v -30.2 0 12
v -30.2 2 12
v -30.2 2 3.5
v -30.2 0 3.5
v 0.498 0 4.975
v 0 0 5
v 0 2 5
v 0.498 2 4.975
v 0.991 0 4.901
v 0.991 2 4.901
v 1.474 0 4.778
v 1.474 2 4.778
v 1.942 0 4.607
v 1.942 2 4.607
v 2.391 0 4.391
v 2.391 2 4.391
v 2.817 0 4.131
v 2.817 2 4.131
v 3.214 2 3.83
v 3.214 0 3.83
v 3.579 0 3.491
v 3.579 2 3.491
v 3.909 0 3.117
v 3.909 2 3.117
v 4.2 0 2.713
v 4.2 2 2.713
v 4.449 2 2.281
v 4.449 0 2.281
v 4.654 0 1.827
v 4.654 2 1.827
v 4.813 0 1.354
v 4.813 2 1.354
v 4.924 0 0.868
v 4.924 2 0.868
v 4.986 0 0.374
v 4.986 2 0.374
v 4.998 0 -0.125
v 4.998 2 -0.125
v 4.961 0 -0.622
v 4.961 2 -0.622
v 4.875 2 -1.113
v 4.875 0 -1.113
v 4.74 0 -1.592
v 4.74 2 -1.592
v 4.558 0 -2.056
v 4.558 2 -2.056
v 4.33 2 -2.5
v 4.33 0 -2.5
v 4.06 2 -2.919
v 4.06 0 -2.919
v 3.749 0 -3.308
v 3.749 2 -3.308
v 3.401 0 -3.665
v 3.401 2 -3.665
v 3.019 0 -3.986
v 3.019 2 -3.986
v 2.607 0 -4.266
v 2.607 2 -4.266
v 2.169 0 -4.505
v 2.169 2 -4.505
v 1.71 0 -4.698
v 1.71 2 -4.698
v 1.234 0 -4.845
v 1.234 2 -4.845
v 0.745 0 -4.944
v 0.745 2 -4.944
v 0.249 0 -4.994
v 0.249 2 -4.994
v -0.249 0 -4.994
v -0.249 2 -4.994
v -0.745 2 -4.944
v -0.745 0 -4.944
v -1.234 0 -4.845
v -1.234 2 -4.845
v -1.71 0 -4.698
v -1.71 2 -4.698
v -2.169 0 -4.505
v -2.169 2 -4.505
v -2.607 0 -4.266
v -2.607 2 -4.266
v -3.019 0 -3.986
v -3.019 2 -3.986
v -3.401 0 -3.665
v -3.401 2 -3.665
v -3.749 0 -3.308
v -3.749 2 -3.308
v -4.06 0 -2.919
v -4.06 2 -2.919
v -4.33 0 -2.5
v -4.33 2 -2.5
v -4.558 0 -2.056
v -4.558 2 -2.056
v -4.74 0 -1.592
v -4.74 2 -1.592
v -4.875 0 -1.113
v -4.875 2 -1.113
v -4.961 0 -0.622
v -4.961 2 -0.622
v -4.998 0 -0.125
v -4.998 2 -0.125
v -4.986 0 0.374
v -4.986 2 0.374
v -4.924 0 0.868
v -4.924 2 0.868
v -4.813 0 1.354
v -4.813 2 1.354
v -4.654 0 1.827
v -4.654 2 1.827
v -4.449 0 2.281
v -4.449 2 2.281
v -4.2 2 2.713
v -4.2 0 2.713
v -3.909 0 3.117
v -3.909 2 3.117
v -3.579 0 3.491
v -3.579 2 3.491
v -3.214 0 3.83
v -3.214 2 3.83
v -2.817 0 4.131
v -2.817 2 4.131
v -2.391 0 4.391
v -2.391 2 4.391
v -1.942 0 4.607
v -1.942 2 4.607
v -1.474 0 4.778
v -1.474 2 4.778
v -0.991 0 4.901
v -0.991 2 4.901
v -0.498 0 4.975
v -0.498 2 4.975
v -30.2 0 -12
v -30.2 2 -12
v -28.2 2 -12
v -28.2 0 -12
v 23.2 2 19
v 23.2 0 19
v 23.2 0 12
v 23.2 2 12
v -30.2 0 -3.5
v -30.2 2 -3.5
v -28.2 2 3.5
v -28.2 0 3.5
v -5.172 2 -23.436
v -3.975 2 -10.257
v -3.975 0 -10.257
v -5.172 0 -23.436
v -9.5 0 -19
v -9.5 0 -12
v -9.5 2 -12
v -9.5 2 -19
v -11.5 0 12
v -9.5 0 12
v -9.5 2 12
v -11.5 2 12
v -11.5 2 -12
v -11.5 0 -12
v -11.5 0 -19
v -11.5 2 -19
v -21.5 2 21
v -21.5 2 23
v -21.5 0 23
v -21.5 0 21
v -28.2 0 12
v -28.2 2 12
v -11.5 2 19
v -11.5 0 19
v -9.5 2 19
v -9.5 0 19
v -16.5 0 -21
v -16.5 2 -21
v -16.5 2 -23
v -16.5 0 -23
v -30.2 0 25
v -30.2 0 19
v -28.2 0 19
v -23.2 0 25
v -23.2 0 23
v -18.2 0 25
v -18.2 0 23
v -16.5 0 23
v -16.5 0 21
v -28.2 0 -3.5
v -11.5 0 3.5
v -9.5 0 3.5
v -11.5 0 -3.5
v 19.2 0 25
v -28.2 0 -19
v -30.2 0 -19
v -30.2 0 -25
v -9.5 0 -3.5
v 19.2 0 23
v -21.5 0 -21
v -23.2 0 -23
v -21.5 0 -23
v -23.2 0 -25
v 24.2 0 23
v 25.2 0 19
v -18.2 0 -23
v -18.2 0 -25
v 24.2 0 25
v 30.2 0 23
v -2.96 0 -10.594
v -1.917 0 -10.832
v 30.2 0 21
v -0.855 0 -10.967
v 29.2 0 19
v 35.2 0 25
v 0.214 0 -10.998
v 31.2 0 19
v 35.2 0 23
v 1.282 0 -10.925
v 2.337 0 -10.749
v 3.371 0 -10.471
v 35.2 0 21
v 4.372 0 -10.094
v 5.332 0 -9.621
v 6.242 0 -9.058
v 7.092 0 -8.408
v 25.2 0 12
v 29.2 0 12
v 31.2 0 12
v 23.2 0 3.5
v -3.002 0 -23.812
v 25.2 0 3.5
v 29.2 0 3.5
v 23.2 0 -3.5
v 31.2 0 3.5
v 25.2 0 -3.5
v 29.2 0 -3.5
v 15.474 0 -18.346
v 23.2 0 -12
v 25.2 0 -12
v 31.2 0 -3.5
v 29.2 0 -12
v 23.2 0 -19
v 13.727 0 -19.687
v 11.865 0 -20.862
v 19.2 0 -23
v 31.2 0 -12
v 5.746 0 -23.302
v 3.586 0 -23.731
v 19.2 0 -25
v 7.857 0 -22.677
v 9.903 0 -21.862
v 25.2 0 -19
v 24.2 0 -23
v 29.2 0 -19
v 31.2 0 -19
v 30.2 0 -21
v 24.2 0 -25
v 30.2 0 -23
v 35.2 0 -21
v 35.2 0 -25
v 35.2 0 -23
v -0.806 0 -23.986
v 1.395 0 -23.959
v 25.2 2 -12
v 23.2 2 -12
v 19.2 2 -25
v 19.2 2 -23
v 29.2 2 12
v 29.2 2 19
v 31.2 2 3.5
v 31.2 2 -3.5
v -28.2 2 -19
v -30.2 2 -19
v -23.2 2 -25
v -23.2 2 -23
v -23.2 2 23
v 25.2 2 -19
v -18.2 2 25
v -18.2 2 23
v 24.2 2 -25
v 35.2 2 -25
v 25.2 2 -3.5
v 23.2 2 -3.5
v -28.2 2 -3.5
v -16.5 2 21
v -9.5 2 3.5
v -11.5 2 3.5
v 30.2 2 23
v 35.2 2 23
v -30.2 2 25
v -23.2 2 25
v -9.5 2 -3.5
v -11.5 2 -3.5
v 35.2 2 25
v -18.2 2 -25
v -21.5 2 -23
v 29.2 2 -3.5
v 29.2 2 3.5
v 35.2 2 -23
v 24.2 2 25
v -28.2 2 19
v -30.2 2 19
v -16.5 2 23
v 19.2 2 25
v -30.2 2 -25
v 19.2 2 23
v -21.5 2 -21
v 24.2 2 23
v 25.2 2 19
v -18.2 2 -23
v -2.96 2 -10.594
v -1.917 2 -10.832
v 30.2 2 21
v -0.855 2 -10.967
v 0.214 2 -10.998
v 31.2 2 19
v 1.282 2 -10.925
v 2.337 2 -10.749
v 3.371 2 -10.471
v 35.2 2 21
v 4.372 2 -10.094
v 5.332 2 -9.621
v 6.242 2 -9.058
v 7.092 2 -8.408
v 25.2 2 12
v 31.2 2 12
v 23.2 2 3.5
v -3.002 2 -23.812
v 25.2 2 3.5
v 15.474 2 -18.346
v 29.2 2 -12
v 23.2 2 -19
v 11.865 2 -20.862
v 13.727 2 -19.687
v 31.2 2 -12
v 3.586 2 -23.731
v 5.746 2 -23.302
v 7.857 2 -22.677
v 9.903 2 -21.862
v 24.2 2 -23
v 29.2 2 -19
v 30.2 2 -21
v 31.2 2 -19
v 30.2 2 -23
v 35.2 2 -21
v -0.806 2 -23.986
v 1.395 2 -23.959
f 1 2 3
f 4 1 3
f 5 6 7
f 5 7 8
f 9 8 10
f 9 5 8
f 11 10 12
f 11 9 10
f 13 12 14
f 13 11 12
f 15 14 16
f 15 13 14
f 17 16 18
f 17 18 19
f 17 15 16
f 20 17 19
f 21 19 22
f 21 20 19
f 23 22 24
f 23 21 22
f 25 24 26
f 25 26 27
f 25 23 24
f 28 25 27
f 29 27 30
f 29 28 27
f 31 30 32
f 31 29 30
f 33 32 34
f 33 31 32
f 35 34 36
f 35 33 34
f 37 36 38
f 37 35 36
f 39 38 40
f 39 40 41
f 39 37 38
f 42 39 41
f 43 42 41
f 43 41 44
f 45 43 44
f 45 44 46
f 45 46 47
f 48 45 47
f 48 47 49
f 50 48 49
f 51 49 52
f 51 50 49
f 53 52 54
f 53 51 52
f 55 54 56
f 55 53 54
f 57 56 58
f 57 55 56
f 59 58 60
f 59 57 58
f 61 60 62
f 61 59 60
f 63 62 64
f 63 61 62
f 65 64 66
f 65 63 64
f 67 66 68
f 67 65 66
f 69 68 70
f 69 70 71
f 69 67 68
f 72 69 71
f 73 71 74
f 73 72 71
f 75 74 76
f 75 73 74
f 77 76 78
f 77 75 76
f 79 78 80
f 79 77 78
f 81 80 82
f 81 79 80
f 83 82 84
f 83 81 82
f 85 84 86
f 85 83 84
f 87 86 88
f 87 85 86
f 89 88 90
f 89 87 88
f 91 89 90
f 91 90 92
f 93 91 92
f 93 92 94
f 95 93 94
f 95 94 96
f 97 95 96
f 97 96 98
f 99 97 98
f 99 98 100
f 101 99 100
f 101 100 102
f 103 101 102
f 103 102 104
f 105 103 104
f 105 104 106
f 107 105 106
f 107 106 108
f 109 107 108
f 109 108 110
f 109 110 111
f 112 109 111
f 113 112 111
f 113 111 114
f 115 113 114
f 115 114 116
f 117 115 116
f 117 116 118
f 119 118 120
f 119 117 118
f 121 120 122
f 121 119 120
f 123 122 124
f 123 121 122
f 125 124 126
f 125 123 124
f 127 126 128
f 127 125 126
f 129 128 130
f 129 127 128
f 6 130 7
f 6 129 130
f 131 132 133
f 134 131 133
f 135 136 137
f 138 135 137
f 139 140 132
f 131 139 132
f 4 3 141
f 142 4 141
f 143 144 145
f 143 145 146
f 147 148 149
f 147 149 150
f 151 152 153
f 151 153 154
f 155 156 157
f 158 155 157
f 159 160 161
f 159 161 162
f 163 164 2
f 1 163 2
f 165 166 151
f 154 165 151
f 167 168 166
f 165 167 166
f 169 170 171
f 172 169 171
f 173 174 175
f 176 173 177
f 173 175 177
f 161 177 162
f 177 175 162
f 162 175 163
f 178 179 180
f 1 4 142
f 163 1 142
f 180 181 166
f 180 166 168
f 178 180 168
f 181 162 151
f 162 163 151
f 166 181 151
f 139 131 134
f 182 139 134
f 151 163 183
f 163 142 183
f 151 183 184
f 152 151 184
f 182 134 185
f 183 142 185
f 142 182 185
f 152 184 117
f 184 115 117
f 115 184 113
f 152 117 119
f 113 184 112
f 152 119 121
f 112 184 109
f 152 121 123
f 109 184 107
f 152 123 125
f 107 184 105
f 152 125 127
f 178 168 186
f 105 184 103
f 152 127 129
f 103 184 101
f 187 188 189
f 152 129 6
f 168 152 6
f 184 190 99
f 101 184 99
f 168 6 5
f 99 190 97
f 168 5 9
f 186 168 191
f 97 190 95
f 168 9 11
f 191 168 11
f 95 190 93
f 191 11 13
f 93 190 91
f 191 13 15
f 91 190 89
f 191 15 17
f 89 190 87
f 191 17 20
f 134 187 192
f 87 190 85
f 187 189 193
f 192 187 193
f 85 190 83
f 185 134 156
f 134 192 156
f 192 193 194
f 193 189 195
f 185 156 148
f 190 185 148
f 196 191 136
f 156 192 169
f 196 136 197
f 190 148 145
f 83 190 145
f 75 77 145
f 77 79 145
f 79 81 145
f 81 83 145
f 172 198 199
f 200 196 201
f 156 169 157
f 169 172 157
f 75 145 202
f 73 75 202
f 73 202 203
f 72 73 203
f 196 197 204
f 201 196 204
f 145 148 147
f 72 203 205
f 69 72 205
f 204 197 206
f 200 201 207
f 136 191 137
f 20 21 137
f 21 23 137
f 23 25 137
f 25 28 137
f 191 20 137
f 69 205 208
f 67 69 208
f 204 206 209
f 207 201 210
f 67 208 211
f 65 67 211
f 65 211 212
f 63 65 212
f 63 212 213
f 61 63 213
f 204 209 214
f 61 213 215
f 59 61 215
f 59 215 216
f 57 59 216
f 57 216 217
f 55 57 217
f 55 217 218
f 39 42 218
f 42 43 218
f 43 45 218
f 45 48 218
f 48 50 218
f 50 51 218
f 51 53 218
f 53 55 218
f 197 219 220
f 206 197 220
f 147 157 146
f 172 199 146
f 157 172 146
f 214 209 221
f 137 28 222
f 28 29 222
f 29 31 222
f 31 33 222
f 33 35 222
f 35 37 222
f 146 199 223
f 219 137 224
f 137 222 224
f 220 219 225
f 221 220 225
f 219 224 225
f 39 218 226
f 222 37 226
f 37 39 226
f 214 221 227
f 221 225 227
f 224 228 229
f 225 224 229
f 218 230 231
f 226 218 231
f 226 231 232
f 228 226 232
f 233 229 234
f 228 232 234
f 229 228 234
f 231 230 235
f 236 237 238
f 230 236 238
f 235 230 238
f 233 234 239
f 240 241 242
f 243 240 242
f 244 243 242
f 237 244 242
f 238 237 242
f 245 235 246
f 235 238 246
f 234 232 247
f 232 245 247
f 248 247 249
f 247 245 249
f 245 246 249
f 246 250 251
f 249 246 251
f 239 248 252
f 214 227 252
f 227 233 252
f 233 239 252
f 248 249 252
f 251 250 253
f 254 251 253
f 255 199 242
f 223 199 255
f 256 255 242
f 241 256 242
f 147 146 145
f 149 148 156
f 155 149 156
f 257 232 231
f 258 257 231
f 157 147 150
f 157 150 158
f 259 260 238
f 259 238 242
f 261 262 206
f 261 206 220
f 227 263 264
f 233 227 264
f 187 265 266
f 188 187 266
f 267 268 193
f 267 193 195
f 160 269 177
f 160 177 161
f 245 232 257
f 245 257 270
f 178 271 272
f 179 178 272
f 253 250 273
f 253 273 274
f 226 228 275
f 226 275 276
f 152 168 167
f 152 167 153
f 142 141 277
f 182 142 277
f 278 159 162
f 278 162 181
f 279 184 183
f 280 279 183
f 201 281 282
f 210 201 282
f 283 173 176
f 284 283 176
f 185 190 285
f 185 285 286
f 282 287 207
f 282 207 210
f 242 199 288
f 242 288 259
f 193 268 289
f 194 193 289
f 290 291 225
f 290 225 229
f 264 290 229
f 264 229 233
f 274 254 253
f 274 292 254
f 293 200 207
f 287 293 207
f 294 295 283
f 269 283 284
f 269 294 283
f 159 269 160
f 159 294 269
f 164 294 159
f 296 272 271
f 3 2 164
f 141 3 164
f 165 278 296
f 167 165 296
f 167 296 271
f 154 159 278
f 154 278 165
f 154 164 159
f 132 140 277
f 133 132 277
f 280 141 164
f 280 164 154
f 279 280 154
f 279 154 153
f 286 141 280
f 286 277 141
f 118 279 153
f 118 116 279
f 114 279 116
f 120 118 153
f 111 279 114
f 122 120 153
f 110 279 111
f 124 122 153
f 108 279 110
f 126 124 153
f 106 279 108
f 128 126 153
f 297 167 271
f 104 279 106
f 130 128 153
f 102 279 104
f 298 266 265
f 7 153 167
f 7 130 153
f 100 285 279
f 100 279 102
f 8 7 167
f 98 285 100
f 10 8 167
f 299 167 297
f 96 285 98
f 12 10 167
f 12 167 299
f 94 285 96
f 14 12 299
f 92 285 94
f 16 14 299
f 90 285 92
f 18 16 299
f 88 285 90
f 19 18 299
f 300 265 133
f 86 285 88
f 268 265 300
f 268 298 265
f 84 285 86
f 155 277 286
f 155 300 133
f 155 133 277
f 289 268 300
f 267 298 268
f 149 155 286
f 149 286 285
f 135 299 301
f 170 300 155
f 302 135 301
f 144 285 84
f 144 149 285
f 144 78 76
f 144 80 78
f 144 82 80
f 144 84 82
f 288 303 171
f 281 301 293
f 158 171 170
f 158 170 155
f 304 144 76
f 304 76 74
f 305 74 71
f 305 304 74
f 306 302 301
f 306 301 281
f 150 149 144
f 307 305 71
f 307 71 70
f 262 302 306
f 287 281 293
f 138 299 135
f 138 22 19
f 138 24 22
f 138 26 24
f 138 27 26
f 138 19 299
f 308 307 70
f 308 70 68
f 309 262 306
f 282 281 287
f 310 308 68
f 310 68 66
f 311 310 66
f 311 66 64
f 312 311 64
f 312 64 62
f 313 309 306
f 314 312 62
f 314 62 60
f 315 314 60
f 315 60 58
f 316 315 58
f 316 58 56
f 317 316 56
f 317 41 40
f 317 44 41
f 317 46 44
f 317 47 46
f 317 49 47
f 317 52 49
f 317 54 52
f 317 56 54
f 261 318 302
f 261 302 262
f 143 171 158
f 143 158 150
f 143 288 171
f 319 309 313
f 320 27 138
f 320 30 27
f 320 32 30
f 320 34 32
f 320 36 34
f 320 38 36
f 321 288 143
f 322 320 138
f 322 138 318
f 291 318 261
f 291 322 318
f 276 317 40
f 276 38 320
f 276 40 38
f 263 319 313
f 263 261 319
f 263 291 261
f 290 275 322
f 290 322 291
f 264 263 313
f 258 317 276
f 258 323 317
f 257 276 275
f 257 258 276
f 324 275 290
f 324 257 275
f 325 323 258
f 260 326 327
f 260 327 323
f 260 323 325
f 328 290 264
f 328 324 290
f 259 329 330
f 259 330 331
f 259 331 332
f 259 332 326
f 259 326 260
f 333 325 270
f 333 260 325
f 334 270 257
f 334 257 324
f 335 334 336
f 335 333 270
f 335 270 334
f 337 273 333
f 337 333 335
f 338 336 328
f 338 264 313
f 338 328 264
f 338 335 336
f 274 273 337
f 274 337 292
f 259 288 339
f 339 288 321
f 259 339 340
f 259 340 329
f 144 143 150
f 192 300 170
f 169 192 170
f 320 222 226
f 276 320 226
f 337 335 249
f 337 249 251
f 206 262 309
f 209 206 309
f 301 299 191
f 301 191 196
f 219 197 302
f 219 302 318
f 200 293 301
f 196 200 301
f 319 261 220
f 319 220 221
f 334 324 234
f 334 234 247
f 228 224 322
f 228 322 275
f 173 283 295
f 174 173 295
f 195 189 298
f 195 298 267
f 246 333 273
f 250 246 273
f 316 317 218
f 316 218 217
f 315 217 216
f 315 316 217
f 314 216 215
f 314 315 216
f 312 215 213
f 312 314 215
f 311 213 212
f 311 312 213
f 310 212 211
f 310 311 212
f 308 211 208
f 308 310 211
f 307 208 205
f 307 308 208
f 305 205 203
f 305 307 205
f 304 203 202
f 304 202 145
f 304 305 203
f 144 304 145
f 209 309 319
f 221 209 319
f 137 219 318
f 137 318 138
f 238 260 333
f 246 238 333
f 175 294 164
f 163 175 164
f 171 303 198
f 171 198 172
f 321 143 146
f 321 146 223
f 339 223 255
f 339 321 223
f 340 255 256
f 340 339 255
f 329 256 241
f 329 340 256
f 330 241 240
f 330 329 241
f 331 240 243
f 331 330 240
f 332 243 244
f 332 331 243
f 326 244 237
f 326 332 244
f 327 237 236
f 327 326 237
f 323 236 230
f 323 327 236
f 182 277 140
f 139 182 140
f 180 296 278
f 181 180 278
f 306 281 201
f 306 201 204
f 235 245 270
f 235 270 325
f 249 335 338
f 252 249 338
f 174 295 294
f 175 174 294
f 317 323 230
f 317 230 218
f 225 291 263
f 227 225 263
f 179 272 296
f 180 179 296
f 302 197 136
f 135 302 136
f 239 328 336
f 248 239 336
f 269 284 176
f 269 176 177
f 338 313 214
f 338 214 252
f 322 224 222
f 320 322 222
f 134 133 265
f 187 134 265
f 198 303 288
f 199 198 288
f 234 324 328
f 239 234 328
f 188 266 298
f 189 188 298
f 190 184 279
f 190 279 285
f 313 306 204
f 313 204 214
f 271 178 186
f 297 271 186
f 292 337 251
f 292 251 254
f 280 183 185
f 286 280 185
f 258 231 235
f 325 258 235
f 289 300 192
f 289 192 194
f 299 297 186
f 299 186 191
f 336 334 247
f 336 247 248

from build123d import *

# Parameters (mm, degrees)
SKETCH2_W           = 100
SKETCH2_H           = 50
SKETCH2_R           = 5
BOSS_EXTRUDE1_DEPTH = 2
SKETCH5_W           = 2
SKETCH5_H           = 7
CUT_EXTRUDE3_DEPTH  = 2
CUT_EXTRUDE6_DEPTH  = 2
SKETCH11_W          = 5
SKETCH11_H          = 2
CUT_EXTRUDE7_DEPTH  = 2
SKETCH12_W          = 6.5
SKETCH12_H          = 50
SKETCH12_W_2        = 2.8
CUT_EXTRUDE8_DEPTH  = 6
SKETCH13_W          = 12
SKETCH13_H          = 50
SKETCH13_W_2        = 2
SKETCH13_H_2        = 7
SKETCH13_W_3        = 5
SKETCH13_H_3        = 2
CUT_EXTRUDE10_DEPTH = 6


with BuildPart() as part:
    # Sketch2 → Boss-Extrude1 (new body)
    with BuildSketch(Plane(origin=(0, 0, 0), x_dir=(1, 0, 0), z_dir=(0, 1, 0))):
        Rectangle(SKETCH2_W, SKETCH2_H)
        with Locations(Location((0, 0, 0), (0, 0, 270))):
            Circle(SKETCH2_R, mode=Mode.SUBTRACT)
    extrude(amount=BOSS_EXTRUDE1_DEPTH)

    # Sketch5 → Cut-Extrude3 (cut)
    with BuildSketch(Plane(origin=(0, 0, 0), x_dir=(-1, 0, 0), z_dir=(0, -1, 0))):
        with Locations((-24.2, -15.5)):
            Rectangle(SKETCH5_W, SKETCH5_H)
        with Locations((-24.2, 0)):
            Rectangle(SKETCH5_W, SKETCH5_H)
        with Locations((-24.2, 15.5)):
            Rectangle(SKETCH5_W, SKETCH5_H)
        with Locations((10.5, 15.5)):
            Rectangle(SKETCH5_W, SKETCH5_H)
        with Locations((10.5, 0)):
            Rectangle(SKETCH5_W, SKETCH5_H)
        with Locations((10.5, -15.5)):
            Rectangle(SKETCH5_W, SKETCH5_H)
    extrude(amount=-CUT_EXTRUDE3_DEPTH, mode=Mode.SUBTRACT)

    # Sketch10 → Cut-Extrude6 (cut)
    with BuildSketch(Plane(origin=(0, 2, 0), x_dir=(1, 0, 0), z_dir=(0, 1, 0))):
        with BuildLine():
            ThreePointArc((-5.171573663, 23.436186248), (5.745726742, 23.302073389), (15.473926709, 18.345506049))
            Line((15.473926709, 18.345506049), (7.092216408, 8.408356939))
            ThreePointArc((7.092216408, 8.408356939), (1.811815129, 10.849761561), (-3.975341771, 10.256542195))
            Line((-3.975341771, 10.256542195), (-5.171573663, 23.436186248))
        make_face()
    extrude(amount=-CUT_EXTRUDE6_DEPTH, mode=Mode.SUBTRACT)

    # Sketch11 → Cut-Extrude7 (cut)
    with BuildSketch(Plane(origin=(0, 2, 0), x_dir=(1, 0, 0), z_dir=(0, 1, 0))):
        with Locations((32.7, 22)):
            Rectangle(SKETCH11_W, SKETCH11_H)
        with Locations((-19, 22)):
            Rectangle(SKETCH11_W, SKETCH11_H)
        with Locations((-19, -22)):
            Rectangle(SKETCH11_W, SKETCH11_H)
        with Locations((32.7, -22)):
            Rectangle(SKETCH11_W, SKETCH11_H)
    extrude(amount=-CUT_EXTRUDE7_DEPTH, mode=Mode.SUBTRACT)

    # Sketch12 → Cut-Extrude8 (cut)
    with BuildSketch(Plane(origin=(0, 2, 0), x_dir=(1, 0, 0), z_dir=(0, 1, 0))):
        with Locations((-46.75, 0)):
            Rectangle(SKETCH12_W, SKETCH12_H)
        with Locations((48.6, 0)):
            Rectangle(SKETCH12_W_2, SKETCH12_H)
    extrude(amount=-CUT_EXTRUDE8_DEPTH, mode=Mode.SUBTRACT)

    # Sketch13 → Cut-Extrude10 (cut)
    with BuildSketch(Plane(origin=(0, 2, 0), x_dir=(1, 0, 0), z_dir=(0, 1, 0))):
        with Locations((41.2, 0)):
            Rectangle(SKETCH13_W, SKETCH13_H)
        with Locations((30.2, 15.5)):
            Rectangle(SKETCH13_W_2, SKETCH13_H_2)
        with Locations((30.2, -15.5)):
            Rectangle(SKETCH13_W_2, SKETCH13_H_2)
        with Locations((30.2, 0)):
            Rectangle(SKETCH13_W_2, SKETCH13_H_2)
        Polygon((-28.2, 12), (-28.2, 19), (-30.2, 19), (-30.2, 25), (-43.5, 25), (-43.5, -25), (-30.2, -25), (-30.2, -19), (-28.2, -19), (-28.2, -12), (-30.2, -12), (-30.2, -3.5), (-28.2, -3.5), (-28.2, 3.5), (-30.2, 3.5), (-30.2, 12), align=None)
        with Locations((21.7, -24)):
            Rectangle(SKETCH13_W_3, SKETCH13_H_3)
        with Locations((21.7, 24)):
            Rectangle(SKETCH13_W_3, SKETCH13_H_3)
        with Locations((-20.7, 24)):
            Rectangle(SKETCH13_W_3, SKETCH13_H_3)
        with Locations((-20.7, -24)):
            Rectangle(SKETCH13_W_3, SKETCH13_H_3)
    extrude(amount=-CUT_EXTRUDE10_DEPTH, mode=Mode.SUBTRACT)


solid = part.part
